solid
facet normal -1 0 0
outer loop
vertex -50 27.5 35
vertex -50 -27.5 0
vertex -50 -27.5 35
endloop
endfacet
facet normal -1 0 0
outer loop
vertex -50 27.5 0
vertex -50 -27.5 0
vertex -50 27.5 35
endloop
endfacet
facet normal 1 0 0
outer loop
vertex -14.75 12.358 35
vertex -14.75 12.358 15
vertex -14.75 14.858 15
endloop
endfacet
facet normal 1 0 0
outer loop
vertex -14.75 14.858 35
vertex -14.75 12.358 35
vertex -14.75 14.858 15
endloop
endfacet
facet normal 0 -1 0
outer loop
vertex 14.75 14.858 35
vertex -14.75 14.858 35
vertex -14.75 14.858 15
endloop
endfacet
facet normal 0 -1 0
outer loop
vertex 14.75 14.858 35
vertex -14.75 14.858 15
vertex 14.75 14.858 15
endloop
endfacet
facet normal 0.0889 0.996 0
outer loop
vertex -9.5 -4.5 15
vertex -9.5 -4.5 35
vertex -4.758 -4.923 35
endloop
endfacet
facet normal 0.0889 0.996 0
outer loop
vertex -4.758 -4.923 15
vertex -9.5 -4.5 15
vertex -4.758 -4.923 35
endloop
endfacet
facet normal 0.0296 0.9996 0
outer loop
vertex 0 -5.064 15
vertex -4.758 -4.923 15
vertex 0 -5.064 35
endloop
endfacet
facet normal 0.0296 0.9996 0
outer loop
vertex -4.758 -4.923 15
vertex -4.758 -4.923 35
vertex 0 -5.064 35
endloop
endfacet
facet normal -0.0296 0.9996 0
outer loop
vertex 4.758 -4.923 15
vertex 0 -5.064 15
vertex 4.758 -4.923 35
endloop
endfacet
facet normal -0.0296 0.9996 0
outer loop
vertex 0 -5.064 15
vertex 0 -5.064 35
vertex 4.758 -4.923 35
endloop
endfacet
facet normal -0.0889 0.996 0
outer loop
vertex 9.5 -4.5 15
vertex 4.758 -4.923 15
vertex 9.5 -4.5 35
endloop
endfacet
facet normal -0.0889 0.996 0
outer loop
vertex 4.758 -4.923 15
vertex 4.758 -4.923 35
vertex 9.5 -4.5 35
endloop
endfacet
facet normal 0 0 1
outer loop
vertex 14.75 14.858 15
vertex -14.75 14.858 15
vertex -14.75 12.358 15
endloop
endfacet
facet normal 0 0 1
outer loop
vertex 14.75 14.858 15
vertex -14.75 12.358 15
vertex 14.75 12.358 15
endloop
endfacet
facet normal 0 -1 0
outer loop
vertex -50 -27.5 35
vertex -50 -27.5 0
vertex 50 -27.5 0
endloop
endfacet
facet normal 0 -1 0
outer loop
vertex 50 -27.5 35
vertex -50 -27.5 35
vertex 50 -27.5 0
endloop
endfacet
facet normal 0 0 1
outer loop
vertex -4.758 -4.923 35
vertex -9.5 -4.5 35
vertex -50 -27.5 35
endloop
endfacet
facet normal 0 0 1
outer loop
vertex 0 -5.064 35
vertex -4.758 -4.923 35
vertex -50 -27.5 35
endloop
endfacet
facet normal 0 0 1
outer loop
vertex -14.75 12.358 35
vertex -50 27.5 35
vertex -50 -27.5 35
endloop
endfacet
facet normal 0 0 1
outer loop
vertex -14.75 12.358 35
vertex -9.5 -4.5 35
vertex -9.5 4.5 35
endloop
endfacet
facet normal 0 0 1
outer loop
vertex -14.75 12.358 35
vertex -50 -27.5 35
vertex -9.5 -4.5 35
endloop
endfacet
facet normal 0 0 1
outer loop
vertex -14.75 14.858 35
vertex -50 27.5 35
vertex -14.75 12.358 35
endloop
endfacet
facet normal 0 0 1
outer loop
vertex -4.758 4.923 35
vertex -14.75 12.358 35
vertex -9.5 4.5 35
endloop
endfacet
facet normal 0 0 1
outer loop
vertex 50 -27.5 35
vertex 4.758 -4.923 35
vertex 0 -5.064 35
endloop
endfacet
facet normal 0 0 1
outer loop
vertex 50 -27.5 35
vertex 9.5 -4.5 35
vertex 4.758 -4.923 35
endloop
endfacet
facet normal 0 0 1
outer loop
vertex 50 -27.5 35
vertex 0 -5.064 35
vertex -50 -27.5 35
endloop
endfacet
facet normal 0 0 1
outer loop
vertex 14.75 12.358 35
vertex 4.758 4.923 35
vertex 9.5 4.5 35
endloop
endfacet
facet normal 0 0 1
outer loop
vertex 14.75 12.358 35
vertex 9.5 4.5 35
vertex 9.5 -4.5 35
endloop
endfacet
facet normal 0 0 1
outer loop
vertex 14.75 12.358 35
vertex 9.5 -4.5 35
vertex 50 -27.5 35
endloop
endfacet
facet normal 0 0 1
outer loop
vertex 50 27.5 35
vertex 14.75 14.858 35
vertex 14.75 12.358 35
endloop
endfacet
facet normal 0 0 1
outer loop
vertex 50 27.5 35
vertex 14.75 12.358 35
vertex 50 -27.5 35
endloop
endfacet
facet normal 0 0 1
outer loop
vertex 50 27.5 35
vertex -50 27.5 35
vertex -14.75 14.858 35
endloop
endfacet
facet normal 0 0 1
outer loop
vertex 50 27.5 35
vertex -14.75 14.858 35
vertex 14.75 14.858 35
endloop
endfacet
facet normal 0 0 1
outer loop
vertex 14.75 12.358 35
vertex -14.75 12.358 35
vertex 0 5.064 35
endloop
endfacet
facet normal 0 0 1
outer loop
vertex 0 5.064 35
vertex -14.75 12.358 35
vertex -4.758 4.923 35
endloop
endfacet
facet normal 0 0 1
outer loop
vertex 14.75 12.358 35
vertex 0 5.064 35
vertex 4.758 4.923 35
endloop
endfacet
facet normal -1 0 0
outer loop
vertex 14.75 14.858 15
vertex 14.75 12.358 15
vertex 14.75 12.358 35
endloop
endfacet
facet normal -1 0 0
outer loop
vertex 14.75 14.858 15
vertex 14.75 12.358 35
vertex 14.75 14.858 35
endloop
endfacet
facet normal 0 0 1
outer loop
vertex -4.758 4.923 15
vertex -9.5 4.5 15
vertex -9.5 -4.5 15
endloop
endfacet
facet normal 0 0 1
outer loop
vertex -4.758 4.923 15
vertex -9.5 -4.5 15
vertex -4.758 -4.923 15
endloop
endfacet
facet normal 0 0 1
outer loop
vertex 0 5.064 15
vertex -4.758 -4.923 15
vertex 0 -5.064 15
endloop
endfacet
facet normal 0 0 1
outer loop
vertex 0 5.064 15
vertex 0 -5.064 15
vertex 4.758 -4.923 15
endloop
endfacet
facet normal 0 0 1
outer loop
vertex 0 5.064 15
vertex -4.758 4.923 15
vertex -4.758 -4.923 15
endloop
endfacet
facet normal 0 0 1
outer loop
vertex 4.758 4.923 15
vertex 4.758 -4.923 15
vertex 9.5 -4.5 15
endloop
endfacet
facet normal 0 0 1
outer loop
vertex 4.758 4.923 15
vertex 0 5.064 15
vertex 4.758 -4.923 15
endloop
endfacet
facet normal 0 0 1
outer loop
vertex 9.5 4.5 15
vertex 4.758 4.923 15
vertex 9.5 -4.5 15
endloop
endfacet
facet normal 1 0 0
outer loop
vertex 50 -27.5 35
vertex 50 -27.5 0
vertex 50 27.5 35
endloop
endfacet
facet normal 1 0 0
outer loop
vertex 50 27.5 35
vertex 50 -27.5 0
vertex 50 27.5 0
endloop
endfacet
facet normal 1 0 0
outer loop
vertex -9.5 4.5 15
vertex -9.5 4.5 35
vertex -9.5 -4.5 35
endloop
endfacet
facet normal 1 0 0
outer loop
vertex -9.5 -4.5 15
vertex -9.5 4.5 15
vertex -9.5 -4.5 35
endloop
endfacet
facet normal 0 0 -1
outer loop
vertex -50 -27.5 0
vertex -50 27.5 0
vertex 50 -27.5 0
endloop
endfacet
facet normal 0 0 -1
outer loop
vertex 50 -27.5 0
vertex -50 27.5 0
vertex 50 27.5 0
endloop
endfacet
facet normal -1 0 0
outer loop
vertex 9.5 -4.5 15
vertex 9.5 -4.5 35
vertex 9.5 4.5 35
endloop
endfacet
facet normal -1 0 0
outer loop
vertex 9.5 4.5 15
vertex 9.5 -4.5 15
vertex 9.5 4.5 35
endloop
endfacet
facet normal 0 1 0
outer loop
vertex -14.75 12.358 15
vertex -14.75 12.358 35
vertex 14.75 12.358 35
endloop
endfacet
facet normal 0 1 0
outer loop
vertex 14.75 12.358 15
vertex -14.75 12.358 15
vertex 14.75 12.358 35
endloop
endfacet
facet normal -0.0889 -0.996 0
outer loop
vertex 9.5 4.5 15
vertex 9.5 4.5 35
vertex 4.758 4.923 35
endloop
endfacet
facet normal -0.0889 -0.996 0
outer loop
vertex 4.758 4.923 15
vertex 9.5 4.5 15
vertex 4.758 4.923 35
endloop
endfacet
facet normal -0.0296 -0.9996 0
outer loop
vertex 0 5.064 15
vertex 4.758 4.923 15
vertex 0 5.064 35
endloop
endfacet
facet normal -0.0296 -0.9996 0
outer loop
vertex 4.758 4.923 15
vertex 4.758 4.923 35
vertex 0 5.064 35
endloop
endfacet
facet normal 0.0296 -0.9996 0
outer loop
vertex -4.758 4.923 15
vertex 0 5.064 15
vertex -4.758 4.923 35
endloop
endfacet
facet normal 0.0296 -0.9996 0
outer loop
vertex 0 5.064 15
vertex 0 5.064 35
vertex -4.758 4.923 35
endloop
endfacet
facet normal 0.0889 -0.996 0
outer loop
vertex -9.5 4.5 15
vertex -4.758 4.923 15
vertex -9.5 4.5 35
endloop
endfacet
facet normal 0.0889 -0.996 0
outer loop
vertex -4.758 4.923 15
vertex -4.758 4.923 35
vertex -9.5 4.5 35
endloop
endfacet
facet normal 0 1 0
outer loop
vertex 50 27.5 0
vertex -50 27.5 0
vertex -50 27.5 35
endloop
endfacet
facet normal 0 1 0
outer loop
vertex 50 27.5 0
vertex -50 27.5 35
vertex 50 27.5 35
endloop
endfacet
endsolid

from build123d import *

# Parameters (mm, degrees)
ESQUISSE1_W             = 100
ESQUISSE1_H             = 55
BOSS_EXTRU_1_DEPTH      = 35
ESQUISSE2_W             = 29.5
ESQUISSE2_H             = 2.5
ENL_V_MAT_EXTRU_1_DEPTH = 20


with BuildPart() as part:
    # Esquisse1 → Boss.-Extru.1 (new body)
    with BuildSketch(Plane.XY):
        Rectangle(ESQUISSE1_W, ESQUISSE1_H)
    extrude(amount=BOSS_EXTRU_1_DEPTH)

    # Esquisse2 → Enlèv. mat.-Extru.1 (cut)
    with BuildSketch(Plane.XY.offset(35)):
        with BuildLine():
            Line((-9.5, 4.5), (-9.5, -4.5))
            ThreePointArc((-9.5, -4.5), (0, -5.06418194), (9.5, -4.5))
            Line((9.5, -4.5), (9.5, 4.5))
            ThreePointArc((9.5, 4.5), (0, 5.06418194), (-9.5, 4.5))
        make_face()
        with Locations((0, 13.607565721)):
            Rectangle(ESQUISSE2_W, ESQUISSE2_H)
    extrude(amount=-ENL_V_MAT_EXTRU_1_DEPTH, mode=Mode.SUBTRACT)


solid = part.part
